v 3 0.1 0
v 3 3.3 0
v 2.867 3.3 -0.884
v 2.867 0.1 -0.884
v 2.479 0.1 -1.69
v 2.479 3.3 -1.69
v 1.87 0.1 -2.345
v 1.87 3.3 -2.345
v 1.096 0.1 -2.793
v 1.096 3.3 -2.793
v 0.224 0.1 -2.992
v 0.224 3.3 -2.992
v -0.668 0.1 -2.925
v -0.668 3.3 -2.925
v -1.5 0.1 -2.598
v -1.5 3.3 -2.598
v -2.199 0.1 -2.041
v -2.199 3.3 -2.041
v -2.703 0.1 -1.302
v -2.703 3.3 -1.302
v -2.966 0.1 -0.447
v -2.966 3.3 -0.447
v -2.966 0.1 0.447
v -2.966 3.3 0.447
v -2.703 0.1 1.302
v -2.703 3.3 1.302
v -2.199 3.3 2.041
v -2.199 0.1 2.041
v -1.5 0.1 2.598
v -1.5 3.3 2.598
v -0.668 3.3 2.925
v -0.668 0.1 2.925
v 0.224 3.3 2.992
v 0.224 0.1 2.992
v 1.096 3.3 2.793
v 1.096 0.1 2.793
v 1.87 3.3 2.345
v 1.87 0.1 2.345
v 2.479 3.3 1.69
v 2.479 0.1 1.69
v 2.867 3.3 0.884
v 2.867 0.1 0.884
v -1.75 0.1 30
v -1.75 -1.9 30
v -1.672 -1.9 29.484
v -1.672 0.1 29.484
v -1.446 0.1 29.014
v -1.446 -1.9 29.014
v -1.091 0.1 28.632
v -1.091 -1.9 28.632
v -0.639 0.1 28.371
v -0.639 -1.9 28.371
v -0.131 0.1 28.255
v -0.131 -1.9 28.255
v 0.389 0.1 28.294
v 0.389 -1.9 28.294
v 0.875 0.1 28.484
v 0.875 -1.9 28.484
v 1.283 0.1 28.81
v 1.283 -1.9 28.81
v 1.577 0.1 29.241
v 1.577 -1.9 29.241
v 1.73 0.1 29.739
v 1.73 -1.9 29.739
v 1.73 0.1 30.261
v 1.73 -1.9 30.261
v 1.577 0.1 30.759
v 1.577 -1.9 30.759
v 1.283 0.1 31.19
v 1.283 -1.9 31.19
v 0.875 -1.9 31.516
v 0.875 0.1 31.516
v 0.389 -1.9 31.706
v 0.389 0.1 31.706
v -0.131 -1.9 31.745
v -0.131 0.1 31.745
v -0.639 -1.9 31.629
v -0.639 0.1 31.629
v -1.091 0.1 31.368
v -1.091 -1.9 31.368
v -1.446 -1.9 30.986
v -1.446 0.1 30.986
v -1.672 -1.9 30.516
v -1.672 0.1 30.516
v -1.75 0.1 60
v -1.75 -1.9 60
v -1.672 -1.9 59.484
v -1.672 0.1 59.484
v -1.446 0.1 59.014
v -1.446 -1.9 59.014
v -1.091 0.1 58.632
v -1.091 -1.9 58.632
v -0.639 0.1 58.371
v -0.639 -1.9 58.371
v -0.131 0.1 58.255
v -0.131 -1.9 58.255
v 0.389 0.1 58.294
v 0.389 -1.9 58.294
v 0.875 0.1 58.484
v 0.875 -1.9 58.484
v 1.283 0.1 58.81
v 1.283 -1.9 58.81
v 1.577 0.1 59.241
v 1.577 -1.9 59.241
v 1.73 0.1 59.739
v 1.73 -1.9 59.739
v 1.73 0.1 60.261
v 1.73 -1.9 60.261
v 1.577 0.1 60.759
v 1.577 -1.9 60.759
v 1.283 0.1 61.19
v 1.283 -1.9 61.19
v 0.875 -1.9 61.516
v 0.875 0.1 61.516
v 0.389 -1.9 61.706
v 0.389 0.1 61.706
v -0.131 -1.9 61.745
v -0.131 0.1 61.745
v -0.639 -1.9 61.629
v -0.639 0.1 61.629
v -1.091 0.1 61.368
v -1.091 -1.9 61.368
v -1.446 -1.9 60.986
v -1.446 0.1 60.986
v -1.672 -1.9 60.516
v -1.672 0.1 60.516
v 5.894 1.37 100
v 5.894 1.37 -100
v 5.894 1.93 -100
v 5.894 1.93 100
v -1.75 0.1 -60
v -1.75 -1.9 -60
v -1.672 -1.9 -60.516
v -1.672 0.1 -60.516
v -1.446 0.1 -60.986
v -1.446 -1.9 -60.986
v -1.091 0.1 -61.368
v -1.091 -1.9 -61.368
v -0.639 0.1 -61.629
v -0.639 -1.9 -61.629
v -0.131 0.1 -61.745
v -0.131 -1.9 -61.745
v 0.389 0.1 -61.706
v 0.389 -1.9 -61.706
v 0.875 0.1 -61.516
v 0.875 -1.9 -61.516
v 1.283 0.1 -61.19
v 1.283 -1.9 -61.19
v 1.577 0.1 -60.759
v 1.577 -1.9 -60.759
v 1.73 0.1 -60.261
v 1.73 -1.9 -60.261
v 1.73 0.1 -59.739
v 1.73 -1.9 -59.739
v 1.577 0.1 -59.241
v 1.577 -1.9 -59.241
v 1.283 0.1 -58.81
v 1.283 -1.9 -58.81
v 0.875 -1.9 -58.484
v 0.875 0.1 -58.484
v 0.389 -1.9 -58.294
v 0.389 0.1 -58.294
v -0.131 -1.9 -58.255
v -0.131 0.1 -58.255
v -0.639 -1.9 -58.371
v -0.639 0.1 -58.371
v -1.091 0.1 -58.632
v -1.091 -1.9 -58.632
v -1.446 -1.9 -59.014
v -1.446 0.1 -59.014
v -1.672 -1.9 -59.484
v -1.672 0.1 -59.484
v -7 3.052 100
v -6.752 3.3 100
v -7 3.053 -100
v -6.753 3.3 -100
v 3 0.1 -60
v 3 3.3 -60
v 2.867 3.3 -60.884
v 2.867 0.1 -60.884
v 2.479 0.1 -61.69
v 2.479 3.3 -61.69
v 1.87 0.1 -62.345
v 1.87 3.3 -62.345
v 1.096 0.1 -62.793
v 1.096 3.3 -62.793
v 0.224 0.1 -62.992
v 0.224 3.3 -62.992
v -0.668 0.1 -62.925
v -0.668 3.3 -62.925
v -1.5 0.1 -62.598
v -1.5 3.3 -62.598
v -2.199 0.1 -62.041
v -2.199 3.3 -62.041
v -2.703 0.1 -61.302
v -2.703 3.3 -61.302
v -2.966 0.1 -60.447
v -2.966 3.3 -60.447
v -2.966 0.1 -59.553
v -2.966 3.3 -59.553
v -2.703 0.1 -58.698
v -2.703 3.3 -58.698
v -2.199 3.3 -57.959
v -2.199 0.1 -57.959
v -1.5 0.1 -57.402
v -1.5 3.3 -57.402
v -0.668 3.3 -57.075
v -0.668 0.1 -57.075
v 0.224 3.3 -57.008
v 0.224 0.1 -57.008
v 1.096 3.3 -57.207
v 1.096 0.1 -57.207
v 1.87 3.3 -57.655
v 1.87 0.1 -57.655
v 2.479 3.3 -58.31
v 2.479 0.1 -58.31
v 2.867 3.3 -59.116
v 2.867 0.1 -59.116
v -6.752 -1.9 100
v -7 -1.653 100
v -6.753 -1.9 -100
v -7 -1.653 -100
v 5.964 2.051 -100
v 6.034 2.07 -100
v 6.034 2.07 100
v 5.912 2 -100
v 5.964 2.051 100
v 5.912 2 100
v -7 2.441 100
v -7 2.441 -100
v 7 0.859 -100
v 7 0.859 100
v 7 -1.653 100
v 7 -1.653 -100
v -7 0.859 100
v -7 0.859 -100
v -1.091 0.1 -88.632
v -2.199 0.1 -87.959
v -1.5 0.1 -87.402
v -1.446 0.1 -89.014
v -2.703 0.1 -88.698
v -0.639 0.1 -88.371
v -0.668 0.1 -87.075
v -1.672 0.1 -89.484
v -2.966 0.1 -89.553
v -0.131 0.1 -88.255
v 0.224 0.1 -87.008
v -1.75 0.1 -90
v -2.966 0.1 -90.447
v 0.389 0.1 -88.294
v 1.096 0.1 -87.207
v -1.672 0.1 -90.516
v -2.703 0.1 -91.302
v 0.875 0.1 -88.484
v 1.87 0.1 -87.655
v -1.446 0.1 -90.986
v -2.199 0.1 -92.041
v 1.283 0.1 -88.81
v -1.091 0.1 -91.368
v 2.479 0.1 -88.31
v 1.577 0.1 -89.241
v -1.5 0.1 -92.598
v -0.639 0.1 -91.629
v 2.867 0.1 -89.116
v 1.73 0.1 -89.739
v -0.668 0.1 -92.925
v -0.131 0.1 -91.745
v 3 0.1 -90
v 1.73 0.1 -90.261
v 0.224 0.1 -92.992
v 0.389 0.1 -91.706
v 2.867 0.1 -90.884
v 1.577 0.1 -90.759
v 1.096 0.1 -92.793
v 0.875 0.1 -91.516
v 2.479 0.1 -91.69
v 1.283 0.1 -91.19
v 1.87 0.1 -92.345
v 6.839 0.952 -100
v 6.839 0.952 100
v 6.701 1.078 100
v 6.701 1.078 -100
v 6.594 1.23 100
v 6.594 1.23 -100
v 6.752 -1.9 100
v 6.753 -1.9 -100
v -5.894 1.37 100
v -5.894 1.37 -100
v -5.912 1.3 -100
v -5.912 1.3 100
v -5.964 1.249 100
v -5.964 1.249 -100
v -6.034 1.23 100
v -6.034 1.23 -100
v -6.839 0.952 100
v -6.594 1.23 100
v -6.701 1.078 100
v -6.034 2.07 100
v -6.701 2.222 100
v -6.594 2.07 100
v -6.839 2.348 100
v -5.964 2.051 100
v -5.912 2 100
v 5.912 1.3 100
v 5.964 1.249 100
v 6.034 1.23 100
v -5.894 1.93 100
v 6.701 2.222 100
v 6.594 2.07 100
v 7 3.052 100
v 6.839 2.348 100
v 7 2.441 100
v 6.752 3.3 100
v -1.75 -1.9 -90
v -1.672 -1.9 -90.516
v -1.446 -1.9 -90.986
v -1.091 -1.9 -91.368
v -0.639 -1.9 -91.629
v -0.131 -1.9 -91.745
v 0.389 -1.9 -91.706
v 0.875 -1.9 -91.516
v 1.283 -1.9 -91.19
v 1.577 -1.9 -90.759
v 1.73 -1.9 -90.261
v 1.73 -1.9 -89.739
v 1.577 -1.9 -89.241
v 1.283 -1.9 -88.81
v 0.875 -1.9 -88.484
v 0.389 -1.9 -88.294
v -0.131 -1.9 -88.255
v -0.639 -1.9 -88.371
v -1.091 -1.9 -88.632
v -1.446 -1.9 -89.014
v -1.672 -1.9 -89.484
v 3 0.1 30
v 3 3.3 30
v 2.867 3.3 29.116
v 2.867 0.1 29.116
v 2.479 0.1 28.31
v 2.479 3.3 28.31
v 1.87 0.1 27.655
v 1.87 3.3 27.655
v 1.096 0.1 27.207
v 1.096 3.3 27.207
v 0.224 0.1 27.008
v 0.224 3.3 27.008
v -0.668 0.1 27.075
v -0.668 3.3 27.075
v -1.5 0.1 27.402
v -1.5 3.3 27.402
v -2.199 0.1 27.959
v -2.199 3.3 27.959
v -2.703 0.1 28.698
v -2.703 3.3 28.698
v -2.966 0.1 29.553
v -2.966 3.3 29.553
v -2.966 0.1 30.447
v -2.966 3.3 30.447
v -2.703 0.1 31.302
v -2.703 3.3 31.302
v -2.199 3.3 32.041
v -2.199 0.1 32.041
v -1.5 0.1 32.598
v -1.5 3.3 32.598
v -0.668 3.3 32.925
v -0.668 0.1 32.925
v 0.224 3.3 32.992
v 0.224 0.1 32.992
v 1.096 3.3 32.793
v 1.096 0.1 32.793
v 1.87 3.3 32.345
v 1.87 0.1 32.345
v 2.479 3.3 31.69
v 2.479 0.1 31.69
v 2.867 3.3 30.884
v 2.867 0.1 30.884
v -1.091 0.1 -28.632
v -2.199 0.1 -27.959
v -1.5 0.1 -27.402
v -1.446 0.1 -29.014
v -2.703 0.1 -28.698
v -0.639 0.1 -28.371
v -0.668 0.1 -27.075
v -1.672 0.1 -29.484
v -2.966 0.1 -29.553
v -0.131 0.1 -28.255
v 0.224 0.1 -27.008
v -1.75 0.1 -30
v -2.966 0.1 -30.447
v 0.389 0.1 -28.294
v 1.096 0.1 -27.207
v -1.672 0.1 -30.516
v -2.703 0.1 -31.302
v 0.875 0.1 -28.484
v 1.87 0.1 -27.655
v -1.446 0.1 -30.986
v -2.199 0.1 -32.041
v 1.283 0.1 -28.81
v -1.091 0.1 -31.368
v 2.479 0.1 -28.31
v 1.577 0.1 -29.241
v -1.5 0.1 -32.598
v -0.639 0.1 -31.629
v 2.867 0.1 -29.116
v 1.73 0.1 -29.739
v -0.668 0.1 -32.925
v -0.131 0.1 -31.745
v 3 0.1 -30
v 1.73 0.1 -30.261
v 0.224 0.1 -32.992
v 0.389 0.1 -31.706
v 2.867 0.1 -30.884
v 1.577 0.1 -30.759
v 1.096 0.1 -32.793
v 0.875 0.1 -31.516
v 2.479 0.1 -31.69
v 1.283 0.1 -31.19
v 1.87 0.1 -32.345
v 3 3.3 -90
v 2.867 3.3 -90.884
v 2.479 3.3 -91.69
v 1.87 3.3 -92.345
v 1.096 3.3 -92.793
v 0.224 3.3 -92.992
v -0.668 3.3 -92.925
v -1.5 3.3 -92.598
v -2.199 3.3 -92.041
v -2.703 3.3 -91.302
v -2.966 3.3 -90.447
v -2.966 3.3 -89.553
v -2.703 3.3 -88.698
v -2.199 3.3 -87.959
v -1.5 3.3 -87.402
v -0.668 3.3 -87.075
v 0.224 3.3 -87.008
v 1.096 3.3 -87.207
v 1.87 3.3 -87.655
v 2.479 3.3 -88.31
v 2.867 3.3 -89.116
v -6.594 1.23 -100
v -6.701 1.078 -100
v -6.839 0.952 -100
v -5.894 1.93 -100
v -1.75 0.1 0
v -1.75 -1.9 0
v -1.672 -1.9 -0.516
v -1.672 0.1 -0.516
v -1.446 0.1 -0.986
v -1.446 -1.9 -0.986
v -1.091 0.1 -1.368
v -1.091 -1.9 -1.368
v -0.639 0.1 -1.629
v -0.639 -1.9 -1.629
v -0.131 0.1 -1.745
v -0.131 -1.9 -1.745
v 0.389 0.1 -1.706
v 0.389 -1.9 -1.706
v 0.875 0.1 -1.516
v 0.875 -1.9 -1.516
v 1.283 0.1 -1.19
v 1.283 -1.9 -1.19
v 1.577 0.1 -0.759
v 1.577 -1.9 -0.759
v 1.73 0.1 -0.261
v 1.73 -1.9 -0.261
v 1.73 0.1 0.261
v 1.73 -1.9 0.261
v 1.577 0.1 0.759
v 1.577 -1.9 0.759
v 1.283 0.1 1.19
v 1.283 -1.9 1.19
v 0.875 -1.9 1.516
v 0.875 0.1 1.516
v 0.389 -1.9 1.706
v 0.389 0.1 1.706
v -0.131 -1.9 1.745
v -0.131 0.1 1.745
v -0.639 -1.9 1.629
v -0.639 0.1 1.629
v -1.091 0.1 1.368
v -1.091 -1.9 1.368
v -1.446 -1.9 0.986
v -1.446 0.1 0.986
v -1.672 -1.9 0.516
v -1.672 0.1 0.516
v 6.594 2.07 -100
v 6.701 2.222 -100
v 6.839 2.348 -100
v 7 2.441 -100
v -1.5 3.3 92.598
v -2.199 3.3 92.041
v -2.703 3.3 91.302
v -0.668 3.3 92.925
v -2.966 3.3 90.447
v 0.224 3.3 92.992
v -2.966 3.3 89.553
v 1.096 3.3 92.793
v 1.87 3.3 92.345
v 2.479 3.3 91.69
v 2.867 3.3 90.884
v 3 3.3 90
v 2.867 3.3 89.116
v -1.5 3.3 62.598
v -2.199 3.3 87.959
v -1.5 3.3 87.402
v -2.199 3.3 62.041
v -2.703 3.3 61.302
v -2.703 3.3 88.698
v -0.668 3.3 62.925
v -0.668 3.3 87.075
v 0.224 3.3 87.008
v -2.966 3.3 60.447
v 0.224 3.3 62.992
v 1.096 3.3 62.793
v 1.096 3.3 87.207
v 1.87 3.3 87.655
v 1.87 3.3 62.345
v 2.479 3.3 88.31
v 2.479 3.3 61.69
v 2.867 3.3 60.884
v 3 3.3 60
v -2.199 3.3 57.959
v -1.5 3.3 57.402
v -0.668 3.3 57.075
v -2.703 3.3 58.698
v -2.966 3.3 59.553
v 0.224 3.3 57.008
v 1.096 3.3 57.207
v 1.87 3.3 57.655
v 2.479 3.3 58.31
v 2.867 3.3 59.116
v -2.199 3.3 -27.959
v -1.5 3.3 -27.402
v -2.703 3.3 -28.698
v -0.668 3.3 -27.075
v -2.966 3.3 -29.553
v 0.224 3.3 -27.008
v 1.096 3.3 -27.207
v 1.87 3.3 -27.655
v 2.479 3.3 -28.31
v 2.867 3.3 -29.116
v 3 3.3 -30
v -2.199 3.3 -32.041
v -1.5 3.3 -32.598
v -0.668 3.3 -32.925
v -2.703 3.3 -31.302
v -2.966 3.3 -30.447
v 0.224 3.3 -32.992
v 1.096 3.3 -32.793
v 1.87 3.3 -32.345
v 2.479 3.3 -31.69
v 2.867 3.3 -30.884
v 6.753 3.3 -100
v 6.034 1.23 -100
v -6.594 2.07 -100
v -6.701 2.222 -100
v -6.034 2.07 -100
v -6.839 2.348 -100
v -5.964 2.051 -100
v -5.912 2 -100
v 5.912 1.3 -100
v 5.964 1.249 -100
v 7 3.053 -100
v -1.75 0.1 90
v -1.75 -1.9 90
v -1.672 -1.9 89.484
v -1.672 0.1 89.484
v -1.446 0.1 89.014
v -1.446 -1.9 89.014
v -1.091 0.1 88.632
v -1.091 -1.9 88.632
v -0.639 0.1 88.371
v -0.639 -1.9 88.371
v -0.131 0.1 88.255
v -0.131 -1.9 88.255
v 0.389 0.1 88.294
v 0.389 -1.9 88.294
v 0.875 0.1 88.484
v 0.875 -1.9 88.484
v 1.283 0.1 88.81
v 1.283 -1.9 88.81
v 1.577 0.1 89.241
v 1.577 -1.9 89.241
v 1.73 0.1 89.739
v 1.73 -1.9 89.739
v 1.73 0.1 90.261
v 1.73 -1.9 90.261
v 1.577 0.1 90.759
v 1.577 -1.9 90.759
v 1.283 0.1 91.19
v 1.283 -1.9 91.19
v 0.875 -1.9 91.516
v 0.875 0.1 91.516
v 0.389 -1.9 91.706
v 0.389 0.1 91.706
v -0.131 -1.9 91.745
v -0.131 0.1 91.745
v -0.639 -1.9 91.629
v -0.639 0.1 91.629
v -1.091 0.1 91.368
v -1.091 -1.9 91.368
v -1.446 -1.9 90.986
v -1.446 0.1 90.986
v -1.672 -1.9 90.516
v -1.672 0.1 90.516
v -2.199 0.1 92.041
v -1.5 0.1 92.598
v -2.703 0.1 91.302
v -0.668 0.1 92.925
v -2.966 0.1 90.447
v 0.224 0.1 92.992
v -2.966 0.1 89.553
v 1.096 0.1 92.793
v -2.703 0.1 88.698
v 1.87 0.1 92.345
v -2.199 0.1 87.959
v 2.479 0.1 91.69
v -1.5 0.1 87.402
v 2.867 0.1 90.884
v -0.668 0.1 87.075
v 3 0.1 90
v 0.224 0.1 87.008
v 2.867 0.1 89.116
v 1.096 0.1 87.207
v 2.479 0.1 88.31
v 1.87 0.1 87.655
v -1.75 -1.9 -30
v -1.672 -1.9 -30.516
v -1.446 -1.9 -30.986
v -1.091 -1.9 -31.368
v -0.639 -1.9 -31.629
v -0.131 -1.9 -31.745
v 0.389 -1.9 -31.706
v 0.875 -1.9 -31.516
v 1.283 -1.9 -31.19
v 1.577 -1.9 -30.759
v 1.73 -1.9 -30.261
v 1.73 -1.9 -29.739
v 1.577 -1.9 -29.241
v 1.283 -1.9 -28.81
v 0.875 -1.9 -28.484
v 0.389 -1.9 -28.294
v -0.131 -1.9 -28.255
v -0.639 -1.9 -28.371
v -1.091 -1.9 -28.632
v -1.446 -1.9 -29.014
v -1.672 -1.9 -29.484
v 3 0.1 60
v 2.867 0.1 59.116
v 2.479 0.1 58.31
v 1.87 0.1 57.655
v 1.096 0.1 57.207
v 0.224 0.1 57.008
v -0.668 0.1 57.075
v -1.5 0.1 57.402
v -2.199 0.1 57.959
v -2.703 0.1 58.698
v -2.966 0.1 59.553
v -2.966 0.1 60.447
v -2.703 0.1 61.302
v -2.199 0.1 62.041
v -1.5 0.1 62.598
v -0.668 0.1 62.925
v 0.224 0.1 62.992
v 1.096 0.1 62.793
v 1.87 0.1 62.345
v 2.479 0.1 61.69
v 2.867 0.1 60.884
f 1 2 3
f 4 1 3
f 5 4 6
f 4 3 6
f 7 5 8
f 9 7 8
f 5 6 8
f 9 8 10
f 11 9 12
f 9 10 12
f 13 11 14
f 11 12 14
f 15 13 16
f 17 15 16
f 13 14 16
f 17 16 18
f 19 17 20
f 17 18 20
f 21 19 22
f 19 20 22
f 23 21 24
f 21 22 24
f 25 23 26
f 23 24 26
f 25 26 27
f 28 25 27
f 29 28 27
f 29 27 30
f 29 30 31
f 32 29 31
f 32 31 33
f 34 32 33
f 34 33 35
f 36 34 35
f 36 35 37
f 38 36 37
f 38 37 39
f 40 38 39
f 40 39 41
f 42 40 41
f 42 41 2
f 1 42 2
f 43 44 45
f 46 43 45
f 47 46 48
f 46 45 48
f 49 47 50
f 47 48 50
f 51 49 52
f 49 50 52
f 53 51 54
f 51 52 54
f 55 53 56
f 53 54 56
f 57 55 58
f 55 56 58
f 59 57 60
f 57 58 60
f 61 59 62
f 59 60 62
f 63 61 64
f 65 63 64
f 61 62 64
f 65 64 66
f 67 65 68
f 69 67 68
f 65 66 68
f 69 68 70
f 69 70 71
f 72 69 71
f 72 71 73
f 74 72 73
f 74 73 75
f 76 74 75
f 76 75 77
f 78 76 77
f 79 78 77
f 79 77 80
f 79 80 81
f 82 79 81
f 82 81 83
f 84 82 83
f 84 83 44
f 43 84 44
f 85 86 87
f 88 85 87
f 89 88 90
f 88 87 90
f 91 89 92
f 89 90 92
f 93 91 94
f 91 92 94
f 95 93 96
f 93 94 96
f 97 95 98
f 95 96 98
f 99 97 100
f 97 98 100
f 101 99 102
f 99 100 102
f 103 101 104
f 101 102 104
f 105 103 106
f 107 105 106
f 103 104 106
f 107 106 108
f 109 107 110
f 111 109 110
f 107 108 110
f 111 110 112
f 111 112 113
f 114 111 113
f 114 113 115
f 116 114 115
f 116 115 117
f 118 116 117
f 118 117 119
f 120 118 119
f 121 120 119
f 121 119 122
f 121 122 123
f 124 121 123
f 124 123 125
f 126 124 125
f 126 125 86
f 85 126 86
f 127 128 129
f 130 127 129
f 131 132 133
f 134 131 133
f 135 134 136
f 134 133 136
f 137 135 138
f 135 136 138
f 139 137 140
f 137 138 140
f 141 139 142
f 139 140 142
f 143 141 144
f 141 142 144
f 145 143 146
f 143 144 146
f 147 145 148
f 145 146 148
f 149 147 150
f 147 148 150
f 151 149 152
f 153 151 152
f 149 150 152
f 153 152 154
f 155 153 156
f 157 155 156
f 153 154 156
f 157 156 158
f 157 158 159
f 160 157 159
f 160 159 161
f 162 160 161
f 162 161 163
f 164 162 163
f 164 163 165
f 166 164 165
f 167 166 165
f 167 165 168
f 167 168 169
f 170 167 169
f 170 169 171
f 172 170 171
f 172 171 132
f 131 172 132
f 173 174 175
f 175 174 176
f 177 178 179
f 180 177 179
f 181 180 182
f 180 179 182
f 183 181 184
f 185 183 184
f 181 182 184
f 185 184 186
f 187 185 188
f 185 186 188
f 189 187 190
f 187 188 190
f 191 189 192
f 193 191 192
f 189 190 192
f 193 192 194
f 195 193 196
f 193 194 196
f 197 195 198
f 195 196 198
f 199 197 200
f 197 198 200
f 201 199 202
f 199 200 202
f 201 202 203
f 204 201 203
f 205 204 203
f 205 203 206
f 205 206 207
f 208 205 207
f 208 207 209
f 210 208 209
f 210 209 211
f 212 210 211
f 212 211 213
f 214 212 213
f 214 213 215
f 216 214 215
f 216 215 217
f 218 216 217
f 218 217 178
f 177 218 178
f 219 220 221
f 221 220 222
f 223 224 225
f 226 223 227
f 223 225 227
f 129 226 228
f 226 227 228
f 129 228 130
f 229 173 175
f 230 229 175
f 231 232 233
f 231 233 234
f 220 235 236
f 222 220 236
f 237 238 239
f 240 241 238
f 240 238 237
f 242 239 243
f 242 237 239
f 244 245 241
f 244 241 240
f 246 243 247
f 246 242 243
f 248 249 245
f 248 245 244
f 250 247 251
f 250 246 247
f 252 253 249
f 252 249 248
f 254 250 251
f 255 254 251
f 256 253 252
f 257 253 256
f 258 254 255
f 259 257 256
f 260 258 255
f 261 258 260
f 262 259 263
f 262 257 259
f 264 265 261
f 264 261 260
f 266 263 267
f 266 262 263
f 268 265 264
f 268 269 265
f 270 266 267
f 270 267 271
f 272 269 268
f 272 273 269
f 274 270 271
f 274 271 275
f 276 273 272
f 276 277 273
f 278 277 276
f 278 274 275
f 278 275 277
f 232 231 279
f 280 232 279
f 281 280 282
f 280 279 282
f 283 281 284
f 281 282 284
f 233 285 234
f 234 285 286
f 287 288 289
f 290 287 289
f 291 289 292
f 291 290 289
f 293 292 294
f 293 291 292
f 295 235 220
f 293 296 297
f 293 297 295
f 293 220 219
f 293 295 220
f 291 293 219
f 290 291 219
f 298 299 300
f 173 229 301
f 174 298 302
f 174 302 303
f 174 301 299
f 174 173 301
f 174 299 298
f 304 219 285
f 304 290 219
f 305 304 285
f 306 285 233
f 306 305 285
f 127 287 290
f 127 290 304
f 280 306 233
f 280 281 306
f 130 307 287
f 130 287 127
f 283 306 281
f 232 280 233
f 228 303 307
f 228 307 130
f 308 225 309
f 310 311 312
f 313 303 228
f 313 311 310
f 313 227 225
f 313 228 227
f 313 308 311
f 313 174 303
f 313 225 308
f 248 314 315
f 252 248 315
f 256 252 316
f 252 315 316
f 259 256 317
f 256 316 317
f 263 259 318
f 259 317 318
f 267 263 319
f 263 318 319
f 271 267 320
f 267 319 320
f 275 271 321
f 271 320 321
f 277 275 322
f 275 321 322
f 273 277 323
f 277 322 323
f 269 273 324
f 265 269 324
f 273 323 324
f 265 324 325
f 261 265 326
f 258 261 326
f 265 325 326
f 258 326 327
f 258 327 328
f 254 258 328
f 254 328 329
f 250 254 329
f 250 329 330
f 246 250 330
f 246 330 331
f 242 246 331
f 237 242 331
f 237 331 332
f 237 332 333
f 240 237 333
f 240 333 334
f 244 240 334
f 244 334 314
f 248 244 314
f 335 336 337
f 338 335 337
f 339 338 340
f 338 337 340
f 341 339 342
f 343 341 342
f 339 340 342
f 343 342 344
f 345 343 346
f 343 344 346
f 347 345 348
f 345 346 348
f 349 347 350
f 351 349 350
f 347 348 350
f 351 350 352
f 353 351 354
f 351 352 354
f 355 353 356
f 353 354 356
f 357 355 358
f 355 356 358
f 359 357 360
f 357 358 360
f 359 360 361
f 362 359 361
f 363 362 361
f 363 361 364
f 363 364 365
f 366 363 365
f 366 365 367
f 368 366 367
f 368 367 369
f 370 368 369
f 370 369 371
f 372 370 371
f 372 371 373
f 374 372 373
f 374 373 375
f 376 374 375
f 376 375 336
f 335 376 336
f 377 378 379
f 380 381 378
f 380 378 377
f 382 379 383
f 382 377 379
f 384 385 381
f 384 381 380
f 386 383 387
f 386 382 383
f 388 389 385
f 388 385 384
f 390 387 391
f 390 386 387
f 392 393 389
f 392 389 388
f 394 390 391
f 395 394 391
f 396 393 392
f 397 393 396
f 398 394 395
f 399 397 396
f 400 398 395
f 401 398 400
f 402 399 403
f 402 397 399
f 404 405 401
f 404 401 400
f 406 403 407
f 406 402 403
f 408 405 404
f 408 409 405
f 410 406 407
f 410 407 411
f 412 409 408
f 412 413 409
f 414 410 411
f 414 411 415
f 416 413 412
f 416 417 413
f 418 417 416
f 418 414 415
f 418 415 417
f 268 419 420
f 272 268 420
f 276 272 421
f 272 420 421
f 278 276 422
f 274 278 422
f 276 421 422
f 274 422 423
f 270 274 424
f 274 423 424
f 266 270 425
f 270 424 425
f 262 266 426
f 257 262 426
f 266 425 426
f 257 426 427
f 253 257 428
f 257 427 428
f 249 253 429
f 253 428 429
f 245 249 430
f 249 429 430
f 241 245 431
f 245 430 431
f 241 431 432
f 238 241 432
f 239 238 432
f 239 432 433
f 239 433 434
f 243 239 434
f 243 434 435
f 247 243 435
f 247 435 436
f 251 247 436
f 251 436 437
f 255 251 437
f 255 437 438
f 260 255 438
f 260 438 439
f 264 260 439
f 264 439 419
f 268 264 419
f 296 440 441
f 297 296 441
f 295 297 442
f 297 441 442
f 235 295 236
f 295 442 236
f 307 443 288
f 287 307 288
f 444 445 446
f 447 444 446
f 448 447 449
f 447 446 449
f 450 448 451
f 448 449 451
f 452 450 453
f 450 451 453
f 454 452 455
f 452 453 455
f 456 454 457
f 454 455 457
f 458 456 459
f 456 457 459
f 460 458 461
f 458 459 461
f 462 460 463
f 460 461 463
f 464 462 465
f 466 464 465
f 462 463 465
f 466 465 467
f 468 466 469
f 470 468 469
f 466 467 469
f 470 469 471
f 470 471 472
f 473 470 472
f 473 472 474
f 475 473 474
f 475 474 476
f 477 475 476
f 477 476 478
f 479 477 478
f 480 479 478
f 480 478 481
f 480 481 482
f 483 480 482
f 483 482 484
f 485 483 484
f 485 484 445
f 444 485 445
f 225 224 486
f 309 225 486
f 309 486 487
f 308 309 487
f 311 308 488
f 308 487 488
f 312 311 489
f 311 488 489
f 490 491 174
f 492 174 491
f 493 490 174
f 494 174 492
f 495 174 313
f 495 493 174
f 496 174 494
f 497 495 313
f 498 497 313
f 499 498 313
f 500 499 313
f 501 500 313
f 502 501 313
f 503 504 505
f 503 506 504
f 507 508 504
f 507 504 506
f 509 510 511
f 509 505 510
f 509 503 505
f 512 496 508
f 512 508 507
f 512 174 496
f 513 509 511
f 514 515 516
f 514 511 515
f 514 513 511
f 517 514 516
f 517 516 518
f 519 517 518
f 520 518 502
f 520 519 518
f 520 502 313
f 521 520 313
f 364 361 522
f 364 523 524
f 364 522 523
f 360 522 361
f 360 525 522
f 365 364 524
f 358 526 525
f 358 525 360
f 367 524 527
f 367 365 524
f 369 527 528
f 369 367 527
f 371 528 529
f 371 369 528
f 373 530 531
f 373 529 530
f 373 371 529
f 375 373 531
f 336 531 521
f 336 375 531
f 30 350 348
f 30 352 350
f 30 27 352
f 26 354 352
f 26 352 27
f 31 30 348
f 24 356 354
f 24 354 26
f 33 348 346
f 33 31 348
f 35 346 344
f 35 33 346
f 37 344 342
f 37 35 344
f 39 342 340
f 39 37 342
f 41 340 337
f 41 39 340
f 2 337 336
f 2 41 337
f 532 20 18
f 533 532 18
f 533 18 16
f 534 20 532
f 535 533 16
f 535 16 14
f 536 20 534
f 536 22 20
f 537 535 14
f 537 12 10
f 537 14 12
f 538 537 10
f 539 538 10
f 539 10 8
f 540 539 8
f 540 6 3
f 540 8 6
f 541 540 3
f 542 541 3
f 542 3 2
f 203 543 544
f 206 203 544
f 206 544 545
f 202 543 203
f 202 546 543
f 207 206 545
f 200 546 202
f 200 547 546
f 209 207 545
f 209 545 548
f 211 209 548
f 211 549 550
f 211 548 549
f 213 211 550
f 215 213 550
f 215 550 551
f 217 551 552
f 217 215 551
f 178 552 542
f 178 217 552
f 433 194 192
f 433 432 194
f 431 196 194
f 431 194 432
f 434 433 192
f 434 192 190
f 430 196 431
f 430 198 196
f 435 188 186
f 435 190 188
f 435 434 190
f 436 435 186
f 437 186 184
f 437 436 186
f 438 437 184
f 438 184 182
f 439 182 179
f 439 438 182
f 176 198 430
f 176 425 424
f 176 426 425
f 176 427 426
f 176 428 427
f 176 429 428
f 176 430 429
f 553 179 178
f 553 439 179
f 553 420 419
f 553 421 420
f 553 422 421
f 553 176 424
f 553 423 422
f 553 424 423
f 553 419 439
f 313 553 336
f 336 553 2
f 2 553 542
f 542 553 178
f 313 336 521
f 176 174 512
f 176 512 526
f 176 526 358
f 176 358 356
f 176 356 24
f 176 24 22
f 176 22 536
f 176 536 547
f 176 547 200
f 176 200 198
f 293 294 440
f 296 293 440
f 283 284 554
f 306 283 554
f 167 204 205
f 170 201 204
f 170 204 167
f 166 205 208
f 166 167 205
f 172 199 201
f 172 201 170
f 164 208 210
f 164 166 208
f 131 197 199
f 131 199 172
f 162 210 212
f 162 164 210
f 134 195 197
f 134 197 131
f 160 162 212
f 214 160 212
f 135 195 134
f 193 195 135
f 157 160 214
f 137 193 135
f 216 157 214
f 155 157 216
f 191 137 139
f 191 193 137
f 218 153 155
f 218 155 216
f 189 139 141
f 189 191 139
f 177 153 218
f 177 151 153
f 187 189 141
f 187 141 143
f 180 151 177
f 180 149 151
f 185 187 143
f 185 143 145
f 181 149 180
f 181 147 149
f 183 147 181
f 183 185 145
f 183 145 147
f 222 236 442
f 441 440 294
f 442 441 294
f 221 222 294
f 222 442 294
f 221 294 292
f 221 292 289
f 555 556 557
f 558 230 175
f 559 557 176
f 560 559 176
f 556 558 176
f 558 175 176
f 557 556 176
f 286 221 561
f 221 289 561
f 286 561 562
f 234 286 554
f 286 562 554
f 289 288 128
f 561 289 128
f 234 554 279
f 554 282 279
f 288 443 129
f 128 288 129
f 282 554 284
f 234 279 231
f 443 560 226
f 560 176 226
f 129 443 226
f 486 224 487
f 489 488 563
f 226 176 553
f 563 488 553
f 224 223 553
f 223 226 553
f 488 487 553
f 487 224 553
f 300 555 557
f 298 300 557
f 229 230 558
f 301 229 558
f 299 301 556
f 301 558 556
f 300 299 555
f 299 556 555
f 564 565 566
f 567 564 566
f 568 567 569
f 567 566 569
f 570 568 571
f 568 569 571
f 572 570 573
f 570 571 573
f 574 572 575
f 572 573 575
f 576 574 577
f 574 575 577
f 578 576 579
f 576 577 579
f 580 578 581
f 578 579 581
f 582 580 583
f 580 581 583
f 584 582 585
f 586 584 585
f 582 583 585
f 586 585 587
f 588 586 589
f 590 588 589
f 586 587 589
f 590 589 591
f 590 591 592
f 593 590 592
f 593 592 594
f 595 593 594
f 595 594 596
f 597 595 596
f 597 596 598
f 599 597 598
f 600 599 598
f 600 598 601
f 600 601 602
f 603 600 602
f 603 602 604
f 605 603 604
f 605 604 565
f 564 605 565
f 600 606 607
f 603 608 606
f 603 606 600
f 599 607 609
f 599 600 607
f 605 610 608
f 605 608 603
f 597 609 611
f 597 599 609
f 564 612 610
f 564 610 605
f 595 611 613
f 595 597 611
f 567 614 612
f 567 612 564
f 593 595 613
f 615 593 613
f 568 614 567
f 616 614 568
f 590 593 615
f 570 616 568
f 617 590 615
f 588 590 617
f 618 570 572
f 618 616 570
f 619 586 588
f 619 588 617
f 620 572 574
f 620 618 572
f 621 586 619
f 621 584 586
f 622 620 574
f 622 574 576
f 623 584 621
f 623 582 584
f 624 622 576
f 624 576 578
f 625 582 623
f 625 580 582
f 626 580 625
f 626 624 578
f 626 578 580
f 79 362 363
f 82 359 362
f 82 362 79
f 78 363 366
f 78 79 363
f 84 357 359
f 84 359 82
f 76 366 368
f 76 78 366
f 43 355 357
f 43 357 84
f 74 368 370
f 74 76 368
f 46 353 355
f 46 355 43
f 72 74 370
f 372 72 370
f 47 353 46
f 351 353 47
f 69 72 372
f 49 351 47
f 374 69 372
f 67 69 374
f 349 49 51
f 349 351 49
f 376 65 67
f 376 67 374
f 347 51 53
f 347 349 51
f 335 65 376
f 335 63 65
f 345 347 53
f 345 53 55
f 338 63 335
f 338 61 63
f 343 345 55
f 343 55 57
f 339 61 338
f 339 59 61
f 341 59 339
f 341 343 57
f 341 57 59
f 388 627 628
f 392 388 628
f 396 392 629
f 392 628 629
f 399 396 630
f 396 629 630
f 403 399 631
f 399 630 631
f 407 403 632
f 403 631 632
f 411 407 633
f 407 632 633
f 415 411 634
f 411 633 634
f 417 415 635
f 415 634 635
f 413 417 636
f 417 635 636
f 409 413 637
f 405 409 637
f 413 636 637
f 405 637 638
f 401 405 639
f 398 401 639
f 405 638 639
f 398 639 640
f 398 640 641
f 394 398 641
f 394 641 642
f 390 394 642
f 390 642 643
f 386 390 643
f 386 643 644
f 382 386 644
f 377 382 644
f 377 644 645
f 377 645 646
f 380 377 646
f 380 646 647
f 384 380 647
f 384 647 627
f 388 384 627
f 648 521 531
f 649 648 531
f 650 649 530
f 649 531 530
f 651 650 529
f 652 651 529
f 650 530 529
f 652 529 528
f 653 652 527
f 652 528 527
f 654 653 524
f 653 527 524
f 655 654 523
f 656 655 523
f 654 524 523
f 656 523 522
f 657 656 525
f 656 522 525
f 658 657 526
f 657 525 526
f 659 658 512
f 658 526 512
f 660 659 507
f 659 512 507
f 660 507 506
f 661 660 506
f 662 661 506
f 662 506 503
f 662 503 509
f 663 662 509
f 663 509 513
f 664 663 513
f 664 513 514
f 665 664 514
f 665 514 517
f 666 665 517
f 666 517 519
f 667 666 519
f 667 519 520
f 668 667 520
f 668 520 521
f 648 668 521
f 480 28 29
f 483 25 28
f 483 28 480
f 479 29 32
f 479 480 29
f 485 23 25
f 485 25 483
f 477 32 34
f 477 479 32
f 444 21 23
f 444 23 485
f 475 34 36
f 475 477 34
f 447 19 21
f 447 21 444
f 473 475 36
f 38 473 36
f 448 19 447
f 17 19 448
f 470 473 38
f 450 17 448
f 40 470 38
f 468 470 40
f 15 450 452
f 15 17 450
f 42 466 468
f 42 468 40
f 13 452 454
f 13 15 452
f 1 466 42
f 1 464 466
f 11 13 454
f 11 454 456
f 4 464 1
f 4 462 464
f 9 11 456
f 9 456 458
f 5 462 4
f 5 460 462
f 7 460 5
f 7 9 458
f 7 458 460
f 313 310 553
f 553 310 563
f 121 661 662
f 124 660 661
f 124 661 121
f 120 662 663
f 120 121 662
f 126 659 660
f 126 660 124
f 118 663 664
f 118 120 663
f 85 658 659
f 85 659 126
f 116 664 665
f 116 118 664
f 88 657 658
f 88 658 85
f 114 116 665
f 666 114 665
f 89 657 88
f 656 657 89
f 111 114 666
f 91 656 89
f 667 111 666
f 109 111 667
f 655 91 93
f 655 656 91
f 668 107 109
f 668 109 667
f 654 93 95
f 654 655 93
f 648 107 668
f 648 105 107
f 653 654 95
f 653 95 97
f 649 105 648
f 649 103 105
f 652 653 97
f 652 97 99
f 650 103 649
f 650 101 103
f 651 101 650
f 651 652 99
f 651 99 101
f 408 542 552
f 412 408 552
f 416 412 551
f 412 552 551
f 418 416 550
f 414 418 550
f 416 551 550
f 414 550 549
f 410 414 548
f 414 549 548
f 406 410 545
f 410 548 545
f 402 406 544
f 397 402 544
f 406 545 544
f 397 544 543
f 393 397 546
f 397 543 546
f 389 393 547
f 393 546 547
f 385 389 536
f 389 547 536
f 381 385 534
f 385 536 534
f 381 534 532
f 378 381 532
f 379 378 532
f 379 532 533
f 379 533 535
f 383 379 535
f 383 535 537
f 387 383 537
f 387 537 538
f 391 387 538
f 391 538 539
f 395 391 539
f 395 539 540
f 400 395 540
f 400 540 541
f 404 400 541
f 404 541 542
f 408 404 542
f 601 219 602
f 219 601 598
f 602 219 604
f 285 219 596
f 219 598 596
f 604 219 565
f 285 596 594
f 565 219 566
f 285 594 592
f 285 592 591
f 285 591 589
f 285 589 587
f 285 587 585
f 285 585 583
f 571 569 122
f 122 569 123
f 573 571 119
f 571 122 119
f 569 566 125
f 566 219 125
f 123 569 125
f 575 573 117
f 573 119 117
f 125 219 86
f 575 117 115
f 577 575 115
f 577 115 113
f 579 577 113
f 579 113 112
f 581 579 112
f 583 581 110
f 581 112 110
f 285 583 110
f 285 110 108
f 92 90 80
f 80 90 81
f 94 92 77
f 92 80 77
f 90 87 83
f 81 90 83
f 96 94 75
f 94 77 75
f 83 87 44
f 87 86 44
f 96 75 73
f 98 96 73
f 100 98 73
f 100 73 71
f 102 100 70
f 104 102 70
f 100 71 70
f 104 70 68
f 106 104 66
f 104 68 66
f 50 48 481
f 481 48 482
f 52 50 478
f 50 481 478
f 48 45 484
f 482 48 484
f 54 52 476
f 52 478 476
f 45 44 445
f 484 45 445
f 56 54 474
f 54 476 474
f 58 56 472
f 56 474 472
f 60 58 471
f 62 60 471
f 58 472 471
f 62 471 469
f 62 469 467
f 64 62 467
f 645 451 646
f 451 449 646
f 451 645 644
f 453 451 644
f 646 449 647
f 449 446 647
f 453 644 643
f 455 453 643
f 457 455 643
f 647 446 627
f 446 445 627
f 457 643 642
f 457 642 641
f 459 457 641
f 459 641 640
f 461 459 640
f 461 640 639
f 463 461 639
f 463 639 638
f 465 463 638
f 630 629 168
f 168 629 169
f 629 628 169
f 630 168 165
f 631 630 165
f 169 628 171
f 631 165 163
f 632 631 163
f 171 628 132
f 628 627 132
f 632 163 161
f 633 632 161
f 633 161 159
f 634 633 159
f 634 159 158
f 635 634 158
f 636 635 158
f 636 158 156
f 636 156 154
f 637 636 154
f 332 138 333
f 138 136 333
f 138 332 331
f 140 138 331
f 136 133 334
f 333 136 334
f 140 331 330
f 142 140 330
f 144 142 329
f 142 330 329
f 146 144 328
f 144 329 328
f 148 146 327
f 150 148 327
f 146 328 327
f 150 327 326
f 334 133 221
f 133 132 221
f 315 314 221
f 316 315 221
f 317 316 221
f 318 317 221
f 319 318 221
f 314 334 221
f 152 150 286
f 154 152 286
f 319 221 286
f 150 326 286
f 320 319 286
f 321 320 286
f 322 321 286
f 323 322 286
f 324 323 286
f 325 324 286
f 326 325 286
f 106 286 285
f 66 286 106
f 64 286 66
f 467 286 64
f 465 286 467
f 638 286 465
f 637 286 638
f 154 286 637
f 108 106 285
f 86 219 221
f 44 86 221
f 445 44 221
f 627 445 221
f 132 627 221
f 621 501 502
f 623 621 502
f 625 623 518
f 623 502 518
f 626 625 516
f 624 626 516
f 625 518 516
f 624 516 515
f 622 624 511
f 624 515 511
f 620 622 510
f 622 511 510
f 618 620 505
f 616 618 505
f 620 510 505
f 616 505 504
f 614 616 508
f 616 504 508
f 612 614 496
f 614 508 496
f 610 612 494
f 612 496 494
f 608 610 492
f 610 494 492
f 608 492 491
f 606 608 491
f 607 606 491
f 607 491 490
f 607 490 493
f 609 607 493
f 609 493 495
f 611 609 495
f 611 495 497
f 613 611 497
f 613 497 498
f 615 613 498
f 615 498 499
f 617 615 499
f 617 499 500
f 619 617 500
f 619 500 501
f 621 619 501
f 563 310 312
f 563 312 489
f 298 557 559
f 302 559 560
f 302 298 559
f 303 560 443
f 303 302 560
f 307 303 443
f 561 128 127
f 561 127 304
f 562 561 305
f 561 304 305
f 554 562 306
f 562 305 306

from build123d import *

# Parameters (mm, degrees)
SKETCH_1_W                   = 14
SKETCH_1_H                   = 200
EXTRUDE_1_DEPTH              = 5.2
CUT_EXTRUDE_1_DEPTH          = 201
CUT_EXTRUDE_2_DEPTH          = 201
CUT_EXTRUDE_3_DEPTH          = 201
CUT_EXTRUDE_4_DEPTH          = 201
HOLE_WIZARD_M3_1_D           = 3.5
HOLE_WIZARD_M3_1_DEPTH       = 5.2
HOLE_WIZARD_M3_1_CBORE_D     = 6
HOLE_WIZARD_M3_1_CBORE_DEPTH = 3.2
CHAMFER_1_SIZE               = 0.2475
FILLET_1_R                   = 0.14


with BuildPart() as part:
    # 草图1 → 凸台-拉伸1 (new body)
    with BuildSketch(Plane(origin=(0, 3.3, 0), x_dir=(1, 0, 0), z_dir=(0, 1, 0))):
        Rectangle(SKETCH_1_W, SKETCH_1_H)
    extrude(amount=-EXTRUDE_1_DEPTH)

    # 草图2 → 切除-拉伸1 (cut, through all)
    with BuildSketch(Plane(origin=(0, 0, -100), x_dir=(-1, 0, 0), z_dir=(0, 0, -1))):
        with BuildLine():
            Line((7, 1.23), (7, 2.44125))
            ThreePointArc((7, 2.44125), (6.766476308, 2.288808784), (6.593576466, 2.07))
            Line((6.593576466, 2.07), (5.893576466, 2.07))
            Line((5.893576466, 2.07), (5.893576466, 1.23))
            Line((5.893576466, 1.23), (7, 1.23))
        make_face()
    extrude(amount=-CUT_EXTRUDE_1_DEPTH, mode=Mode.SUBTRACT)

    # 草图3 → 切除-拉伸2 (cut, through all)
    with BuildSketch(Plane(origin=(0, 0, -100), x_dir=(-1, 0, 0), z_dir=(0, 0, -1))):
        with BuildLine():
            Line((7, 0.85875), (7, 1.23))
            Line((7, 1.23), (6.593576466, 1.23))
            ThreePointArc((6.593576466, 1.23), (6.766476308, 1.011191216), (7, 0.85875))
        make_face()
    extrude(amount=-CUT_EXTRUDE_2_DEPTH, mode=Mode.SUBTRACT)

    # 草图4 → 切除-拉伸3 (cut, through all)
    with BuildSketch(Plane(origin=(0, 0, -100), x_dir=(-1, 0, 0), z_dir=(0, 0, -1))):
        with BuildLine():
            Line((-7, 2.07), (-7, 0.85875))
            ThreePointArc((-7, 0.85875), (-6.766476308, 1.011191216), (-6.593576466, 1.23))
            Line((-6.593576466, 1.23), (-5.893576466, 1.23))
            Line((-5.893576466, 1.23), (-5.893576466, 2.07))
            Line((-5.893576466, 2.07), (-7, 2.07))
        make_face()
    extrude(amount=-CUT_EXTRUDE_3_DEPTH, mode=Mode.SUBTRACT)

    # 草图5 → 切除-拉伸4 (cut, through all)
    with BuildSketch(Plane(origin=(0, 0, -100), x_dir=(-1, 0, 0), z_dir=(0, 0, -1))):
        with BuildLine():
            Line((-7, 2.44125), (-7, 2.07))
            Line((-7, 2.07), (-6.593576466, 2.07))
            ThreePointArc((-6.593576466, 2.07), (-6.766476308, 2.288808784), (-7, 2.44125))
        make_face()
    extrude(amount=-CUT_EXTRUDE_4_DEPTH, mode=Mode.SUBTRACT)

    # M3 六角头机械螺钉的柱形沉头孔1
    with Locations(Plane(origin=(0, 3.3, 0), x_dir=(1, 0, 0), z_dir=(0, 1, 0))):
        with Locations((0, 90), (0, 60), (0, 30), (0, 0), (0, -30), (0, -60), (0, -90)):
            CounterBoreHole(HOLE_WIZARD_M3_1_D / 2, HOLE_WIZARD_M3_1_CBORE_D / 2, HOLE_WIZARD_M3_1_CBORE_DEPTH, depth=HOLE_WIZARD_M3_1_DEPTH)

    # 倒角1
    chamfer_1_edges = [part.edges().sort_by_distance(p)[0] for p in [
        (7, -1.9, 0),
        (-7, -1.9, 0),
        (7, 3.3, 0),
        (-7, 3.3, 0),
    ]]
    chamfer(chamfer_1_edges, length=CHAMFER_1_SIZE)

    # 圆角1
    fillet_1_edges = [part.edges().sort_by_distance(p)[0] for p in [
        (-5.893576466, 1.23, 0),
        (-5.893576466, 2.07, 0),
        (5.893576466, 2.07, 0),
        (5.893576466, 1.23, 0),
    ]]
    fillet(fillet_1_edges, radius=FILLET_1_R)


solid = part.part
